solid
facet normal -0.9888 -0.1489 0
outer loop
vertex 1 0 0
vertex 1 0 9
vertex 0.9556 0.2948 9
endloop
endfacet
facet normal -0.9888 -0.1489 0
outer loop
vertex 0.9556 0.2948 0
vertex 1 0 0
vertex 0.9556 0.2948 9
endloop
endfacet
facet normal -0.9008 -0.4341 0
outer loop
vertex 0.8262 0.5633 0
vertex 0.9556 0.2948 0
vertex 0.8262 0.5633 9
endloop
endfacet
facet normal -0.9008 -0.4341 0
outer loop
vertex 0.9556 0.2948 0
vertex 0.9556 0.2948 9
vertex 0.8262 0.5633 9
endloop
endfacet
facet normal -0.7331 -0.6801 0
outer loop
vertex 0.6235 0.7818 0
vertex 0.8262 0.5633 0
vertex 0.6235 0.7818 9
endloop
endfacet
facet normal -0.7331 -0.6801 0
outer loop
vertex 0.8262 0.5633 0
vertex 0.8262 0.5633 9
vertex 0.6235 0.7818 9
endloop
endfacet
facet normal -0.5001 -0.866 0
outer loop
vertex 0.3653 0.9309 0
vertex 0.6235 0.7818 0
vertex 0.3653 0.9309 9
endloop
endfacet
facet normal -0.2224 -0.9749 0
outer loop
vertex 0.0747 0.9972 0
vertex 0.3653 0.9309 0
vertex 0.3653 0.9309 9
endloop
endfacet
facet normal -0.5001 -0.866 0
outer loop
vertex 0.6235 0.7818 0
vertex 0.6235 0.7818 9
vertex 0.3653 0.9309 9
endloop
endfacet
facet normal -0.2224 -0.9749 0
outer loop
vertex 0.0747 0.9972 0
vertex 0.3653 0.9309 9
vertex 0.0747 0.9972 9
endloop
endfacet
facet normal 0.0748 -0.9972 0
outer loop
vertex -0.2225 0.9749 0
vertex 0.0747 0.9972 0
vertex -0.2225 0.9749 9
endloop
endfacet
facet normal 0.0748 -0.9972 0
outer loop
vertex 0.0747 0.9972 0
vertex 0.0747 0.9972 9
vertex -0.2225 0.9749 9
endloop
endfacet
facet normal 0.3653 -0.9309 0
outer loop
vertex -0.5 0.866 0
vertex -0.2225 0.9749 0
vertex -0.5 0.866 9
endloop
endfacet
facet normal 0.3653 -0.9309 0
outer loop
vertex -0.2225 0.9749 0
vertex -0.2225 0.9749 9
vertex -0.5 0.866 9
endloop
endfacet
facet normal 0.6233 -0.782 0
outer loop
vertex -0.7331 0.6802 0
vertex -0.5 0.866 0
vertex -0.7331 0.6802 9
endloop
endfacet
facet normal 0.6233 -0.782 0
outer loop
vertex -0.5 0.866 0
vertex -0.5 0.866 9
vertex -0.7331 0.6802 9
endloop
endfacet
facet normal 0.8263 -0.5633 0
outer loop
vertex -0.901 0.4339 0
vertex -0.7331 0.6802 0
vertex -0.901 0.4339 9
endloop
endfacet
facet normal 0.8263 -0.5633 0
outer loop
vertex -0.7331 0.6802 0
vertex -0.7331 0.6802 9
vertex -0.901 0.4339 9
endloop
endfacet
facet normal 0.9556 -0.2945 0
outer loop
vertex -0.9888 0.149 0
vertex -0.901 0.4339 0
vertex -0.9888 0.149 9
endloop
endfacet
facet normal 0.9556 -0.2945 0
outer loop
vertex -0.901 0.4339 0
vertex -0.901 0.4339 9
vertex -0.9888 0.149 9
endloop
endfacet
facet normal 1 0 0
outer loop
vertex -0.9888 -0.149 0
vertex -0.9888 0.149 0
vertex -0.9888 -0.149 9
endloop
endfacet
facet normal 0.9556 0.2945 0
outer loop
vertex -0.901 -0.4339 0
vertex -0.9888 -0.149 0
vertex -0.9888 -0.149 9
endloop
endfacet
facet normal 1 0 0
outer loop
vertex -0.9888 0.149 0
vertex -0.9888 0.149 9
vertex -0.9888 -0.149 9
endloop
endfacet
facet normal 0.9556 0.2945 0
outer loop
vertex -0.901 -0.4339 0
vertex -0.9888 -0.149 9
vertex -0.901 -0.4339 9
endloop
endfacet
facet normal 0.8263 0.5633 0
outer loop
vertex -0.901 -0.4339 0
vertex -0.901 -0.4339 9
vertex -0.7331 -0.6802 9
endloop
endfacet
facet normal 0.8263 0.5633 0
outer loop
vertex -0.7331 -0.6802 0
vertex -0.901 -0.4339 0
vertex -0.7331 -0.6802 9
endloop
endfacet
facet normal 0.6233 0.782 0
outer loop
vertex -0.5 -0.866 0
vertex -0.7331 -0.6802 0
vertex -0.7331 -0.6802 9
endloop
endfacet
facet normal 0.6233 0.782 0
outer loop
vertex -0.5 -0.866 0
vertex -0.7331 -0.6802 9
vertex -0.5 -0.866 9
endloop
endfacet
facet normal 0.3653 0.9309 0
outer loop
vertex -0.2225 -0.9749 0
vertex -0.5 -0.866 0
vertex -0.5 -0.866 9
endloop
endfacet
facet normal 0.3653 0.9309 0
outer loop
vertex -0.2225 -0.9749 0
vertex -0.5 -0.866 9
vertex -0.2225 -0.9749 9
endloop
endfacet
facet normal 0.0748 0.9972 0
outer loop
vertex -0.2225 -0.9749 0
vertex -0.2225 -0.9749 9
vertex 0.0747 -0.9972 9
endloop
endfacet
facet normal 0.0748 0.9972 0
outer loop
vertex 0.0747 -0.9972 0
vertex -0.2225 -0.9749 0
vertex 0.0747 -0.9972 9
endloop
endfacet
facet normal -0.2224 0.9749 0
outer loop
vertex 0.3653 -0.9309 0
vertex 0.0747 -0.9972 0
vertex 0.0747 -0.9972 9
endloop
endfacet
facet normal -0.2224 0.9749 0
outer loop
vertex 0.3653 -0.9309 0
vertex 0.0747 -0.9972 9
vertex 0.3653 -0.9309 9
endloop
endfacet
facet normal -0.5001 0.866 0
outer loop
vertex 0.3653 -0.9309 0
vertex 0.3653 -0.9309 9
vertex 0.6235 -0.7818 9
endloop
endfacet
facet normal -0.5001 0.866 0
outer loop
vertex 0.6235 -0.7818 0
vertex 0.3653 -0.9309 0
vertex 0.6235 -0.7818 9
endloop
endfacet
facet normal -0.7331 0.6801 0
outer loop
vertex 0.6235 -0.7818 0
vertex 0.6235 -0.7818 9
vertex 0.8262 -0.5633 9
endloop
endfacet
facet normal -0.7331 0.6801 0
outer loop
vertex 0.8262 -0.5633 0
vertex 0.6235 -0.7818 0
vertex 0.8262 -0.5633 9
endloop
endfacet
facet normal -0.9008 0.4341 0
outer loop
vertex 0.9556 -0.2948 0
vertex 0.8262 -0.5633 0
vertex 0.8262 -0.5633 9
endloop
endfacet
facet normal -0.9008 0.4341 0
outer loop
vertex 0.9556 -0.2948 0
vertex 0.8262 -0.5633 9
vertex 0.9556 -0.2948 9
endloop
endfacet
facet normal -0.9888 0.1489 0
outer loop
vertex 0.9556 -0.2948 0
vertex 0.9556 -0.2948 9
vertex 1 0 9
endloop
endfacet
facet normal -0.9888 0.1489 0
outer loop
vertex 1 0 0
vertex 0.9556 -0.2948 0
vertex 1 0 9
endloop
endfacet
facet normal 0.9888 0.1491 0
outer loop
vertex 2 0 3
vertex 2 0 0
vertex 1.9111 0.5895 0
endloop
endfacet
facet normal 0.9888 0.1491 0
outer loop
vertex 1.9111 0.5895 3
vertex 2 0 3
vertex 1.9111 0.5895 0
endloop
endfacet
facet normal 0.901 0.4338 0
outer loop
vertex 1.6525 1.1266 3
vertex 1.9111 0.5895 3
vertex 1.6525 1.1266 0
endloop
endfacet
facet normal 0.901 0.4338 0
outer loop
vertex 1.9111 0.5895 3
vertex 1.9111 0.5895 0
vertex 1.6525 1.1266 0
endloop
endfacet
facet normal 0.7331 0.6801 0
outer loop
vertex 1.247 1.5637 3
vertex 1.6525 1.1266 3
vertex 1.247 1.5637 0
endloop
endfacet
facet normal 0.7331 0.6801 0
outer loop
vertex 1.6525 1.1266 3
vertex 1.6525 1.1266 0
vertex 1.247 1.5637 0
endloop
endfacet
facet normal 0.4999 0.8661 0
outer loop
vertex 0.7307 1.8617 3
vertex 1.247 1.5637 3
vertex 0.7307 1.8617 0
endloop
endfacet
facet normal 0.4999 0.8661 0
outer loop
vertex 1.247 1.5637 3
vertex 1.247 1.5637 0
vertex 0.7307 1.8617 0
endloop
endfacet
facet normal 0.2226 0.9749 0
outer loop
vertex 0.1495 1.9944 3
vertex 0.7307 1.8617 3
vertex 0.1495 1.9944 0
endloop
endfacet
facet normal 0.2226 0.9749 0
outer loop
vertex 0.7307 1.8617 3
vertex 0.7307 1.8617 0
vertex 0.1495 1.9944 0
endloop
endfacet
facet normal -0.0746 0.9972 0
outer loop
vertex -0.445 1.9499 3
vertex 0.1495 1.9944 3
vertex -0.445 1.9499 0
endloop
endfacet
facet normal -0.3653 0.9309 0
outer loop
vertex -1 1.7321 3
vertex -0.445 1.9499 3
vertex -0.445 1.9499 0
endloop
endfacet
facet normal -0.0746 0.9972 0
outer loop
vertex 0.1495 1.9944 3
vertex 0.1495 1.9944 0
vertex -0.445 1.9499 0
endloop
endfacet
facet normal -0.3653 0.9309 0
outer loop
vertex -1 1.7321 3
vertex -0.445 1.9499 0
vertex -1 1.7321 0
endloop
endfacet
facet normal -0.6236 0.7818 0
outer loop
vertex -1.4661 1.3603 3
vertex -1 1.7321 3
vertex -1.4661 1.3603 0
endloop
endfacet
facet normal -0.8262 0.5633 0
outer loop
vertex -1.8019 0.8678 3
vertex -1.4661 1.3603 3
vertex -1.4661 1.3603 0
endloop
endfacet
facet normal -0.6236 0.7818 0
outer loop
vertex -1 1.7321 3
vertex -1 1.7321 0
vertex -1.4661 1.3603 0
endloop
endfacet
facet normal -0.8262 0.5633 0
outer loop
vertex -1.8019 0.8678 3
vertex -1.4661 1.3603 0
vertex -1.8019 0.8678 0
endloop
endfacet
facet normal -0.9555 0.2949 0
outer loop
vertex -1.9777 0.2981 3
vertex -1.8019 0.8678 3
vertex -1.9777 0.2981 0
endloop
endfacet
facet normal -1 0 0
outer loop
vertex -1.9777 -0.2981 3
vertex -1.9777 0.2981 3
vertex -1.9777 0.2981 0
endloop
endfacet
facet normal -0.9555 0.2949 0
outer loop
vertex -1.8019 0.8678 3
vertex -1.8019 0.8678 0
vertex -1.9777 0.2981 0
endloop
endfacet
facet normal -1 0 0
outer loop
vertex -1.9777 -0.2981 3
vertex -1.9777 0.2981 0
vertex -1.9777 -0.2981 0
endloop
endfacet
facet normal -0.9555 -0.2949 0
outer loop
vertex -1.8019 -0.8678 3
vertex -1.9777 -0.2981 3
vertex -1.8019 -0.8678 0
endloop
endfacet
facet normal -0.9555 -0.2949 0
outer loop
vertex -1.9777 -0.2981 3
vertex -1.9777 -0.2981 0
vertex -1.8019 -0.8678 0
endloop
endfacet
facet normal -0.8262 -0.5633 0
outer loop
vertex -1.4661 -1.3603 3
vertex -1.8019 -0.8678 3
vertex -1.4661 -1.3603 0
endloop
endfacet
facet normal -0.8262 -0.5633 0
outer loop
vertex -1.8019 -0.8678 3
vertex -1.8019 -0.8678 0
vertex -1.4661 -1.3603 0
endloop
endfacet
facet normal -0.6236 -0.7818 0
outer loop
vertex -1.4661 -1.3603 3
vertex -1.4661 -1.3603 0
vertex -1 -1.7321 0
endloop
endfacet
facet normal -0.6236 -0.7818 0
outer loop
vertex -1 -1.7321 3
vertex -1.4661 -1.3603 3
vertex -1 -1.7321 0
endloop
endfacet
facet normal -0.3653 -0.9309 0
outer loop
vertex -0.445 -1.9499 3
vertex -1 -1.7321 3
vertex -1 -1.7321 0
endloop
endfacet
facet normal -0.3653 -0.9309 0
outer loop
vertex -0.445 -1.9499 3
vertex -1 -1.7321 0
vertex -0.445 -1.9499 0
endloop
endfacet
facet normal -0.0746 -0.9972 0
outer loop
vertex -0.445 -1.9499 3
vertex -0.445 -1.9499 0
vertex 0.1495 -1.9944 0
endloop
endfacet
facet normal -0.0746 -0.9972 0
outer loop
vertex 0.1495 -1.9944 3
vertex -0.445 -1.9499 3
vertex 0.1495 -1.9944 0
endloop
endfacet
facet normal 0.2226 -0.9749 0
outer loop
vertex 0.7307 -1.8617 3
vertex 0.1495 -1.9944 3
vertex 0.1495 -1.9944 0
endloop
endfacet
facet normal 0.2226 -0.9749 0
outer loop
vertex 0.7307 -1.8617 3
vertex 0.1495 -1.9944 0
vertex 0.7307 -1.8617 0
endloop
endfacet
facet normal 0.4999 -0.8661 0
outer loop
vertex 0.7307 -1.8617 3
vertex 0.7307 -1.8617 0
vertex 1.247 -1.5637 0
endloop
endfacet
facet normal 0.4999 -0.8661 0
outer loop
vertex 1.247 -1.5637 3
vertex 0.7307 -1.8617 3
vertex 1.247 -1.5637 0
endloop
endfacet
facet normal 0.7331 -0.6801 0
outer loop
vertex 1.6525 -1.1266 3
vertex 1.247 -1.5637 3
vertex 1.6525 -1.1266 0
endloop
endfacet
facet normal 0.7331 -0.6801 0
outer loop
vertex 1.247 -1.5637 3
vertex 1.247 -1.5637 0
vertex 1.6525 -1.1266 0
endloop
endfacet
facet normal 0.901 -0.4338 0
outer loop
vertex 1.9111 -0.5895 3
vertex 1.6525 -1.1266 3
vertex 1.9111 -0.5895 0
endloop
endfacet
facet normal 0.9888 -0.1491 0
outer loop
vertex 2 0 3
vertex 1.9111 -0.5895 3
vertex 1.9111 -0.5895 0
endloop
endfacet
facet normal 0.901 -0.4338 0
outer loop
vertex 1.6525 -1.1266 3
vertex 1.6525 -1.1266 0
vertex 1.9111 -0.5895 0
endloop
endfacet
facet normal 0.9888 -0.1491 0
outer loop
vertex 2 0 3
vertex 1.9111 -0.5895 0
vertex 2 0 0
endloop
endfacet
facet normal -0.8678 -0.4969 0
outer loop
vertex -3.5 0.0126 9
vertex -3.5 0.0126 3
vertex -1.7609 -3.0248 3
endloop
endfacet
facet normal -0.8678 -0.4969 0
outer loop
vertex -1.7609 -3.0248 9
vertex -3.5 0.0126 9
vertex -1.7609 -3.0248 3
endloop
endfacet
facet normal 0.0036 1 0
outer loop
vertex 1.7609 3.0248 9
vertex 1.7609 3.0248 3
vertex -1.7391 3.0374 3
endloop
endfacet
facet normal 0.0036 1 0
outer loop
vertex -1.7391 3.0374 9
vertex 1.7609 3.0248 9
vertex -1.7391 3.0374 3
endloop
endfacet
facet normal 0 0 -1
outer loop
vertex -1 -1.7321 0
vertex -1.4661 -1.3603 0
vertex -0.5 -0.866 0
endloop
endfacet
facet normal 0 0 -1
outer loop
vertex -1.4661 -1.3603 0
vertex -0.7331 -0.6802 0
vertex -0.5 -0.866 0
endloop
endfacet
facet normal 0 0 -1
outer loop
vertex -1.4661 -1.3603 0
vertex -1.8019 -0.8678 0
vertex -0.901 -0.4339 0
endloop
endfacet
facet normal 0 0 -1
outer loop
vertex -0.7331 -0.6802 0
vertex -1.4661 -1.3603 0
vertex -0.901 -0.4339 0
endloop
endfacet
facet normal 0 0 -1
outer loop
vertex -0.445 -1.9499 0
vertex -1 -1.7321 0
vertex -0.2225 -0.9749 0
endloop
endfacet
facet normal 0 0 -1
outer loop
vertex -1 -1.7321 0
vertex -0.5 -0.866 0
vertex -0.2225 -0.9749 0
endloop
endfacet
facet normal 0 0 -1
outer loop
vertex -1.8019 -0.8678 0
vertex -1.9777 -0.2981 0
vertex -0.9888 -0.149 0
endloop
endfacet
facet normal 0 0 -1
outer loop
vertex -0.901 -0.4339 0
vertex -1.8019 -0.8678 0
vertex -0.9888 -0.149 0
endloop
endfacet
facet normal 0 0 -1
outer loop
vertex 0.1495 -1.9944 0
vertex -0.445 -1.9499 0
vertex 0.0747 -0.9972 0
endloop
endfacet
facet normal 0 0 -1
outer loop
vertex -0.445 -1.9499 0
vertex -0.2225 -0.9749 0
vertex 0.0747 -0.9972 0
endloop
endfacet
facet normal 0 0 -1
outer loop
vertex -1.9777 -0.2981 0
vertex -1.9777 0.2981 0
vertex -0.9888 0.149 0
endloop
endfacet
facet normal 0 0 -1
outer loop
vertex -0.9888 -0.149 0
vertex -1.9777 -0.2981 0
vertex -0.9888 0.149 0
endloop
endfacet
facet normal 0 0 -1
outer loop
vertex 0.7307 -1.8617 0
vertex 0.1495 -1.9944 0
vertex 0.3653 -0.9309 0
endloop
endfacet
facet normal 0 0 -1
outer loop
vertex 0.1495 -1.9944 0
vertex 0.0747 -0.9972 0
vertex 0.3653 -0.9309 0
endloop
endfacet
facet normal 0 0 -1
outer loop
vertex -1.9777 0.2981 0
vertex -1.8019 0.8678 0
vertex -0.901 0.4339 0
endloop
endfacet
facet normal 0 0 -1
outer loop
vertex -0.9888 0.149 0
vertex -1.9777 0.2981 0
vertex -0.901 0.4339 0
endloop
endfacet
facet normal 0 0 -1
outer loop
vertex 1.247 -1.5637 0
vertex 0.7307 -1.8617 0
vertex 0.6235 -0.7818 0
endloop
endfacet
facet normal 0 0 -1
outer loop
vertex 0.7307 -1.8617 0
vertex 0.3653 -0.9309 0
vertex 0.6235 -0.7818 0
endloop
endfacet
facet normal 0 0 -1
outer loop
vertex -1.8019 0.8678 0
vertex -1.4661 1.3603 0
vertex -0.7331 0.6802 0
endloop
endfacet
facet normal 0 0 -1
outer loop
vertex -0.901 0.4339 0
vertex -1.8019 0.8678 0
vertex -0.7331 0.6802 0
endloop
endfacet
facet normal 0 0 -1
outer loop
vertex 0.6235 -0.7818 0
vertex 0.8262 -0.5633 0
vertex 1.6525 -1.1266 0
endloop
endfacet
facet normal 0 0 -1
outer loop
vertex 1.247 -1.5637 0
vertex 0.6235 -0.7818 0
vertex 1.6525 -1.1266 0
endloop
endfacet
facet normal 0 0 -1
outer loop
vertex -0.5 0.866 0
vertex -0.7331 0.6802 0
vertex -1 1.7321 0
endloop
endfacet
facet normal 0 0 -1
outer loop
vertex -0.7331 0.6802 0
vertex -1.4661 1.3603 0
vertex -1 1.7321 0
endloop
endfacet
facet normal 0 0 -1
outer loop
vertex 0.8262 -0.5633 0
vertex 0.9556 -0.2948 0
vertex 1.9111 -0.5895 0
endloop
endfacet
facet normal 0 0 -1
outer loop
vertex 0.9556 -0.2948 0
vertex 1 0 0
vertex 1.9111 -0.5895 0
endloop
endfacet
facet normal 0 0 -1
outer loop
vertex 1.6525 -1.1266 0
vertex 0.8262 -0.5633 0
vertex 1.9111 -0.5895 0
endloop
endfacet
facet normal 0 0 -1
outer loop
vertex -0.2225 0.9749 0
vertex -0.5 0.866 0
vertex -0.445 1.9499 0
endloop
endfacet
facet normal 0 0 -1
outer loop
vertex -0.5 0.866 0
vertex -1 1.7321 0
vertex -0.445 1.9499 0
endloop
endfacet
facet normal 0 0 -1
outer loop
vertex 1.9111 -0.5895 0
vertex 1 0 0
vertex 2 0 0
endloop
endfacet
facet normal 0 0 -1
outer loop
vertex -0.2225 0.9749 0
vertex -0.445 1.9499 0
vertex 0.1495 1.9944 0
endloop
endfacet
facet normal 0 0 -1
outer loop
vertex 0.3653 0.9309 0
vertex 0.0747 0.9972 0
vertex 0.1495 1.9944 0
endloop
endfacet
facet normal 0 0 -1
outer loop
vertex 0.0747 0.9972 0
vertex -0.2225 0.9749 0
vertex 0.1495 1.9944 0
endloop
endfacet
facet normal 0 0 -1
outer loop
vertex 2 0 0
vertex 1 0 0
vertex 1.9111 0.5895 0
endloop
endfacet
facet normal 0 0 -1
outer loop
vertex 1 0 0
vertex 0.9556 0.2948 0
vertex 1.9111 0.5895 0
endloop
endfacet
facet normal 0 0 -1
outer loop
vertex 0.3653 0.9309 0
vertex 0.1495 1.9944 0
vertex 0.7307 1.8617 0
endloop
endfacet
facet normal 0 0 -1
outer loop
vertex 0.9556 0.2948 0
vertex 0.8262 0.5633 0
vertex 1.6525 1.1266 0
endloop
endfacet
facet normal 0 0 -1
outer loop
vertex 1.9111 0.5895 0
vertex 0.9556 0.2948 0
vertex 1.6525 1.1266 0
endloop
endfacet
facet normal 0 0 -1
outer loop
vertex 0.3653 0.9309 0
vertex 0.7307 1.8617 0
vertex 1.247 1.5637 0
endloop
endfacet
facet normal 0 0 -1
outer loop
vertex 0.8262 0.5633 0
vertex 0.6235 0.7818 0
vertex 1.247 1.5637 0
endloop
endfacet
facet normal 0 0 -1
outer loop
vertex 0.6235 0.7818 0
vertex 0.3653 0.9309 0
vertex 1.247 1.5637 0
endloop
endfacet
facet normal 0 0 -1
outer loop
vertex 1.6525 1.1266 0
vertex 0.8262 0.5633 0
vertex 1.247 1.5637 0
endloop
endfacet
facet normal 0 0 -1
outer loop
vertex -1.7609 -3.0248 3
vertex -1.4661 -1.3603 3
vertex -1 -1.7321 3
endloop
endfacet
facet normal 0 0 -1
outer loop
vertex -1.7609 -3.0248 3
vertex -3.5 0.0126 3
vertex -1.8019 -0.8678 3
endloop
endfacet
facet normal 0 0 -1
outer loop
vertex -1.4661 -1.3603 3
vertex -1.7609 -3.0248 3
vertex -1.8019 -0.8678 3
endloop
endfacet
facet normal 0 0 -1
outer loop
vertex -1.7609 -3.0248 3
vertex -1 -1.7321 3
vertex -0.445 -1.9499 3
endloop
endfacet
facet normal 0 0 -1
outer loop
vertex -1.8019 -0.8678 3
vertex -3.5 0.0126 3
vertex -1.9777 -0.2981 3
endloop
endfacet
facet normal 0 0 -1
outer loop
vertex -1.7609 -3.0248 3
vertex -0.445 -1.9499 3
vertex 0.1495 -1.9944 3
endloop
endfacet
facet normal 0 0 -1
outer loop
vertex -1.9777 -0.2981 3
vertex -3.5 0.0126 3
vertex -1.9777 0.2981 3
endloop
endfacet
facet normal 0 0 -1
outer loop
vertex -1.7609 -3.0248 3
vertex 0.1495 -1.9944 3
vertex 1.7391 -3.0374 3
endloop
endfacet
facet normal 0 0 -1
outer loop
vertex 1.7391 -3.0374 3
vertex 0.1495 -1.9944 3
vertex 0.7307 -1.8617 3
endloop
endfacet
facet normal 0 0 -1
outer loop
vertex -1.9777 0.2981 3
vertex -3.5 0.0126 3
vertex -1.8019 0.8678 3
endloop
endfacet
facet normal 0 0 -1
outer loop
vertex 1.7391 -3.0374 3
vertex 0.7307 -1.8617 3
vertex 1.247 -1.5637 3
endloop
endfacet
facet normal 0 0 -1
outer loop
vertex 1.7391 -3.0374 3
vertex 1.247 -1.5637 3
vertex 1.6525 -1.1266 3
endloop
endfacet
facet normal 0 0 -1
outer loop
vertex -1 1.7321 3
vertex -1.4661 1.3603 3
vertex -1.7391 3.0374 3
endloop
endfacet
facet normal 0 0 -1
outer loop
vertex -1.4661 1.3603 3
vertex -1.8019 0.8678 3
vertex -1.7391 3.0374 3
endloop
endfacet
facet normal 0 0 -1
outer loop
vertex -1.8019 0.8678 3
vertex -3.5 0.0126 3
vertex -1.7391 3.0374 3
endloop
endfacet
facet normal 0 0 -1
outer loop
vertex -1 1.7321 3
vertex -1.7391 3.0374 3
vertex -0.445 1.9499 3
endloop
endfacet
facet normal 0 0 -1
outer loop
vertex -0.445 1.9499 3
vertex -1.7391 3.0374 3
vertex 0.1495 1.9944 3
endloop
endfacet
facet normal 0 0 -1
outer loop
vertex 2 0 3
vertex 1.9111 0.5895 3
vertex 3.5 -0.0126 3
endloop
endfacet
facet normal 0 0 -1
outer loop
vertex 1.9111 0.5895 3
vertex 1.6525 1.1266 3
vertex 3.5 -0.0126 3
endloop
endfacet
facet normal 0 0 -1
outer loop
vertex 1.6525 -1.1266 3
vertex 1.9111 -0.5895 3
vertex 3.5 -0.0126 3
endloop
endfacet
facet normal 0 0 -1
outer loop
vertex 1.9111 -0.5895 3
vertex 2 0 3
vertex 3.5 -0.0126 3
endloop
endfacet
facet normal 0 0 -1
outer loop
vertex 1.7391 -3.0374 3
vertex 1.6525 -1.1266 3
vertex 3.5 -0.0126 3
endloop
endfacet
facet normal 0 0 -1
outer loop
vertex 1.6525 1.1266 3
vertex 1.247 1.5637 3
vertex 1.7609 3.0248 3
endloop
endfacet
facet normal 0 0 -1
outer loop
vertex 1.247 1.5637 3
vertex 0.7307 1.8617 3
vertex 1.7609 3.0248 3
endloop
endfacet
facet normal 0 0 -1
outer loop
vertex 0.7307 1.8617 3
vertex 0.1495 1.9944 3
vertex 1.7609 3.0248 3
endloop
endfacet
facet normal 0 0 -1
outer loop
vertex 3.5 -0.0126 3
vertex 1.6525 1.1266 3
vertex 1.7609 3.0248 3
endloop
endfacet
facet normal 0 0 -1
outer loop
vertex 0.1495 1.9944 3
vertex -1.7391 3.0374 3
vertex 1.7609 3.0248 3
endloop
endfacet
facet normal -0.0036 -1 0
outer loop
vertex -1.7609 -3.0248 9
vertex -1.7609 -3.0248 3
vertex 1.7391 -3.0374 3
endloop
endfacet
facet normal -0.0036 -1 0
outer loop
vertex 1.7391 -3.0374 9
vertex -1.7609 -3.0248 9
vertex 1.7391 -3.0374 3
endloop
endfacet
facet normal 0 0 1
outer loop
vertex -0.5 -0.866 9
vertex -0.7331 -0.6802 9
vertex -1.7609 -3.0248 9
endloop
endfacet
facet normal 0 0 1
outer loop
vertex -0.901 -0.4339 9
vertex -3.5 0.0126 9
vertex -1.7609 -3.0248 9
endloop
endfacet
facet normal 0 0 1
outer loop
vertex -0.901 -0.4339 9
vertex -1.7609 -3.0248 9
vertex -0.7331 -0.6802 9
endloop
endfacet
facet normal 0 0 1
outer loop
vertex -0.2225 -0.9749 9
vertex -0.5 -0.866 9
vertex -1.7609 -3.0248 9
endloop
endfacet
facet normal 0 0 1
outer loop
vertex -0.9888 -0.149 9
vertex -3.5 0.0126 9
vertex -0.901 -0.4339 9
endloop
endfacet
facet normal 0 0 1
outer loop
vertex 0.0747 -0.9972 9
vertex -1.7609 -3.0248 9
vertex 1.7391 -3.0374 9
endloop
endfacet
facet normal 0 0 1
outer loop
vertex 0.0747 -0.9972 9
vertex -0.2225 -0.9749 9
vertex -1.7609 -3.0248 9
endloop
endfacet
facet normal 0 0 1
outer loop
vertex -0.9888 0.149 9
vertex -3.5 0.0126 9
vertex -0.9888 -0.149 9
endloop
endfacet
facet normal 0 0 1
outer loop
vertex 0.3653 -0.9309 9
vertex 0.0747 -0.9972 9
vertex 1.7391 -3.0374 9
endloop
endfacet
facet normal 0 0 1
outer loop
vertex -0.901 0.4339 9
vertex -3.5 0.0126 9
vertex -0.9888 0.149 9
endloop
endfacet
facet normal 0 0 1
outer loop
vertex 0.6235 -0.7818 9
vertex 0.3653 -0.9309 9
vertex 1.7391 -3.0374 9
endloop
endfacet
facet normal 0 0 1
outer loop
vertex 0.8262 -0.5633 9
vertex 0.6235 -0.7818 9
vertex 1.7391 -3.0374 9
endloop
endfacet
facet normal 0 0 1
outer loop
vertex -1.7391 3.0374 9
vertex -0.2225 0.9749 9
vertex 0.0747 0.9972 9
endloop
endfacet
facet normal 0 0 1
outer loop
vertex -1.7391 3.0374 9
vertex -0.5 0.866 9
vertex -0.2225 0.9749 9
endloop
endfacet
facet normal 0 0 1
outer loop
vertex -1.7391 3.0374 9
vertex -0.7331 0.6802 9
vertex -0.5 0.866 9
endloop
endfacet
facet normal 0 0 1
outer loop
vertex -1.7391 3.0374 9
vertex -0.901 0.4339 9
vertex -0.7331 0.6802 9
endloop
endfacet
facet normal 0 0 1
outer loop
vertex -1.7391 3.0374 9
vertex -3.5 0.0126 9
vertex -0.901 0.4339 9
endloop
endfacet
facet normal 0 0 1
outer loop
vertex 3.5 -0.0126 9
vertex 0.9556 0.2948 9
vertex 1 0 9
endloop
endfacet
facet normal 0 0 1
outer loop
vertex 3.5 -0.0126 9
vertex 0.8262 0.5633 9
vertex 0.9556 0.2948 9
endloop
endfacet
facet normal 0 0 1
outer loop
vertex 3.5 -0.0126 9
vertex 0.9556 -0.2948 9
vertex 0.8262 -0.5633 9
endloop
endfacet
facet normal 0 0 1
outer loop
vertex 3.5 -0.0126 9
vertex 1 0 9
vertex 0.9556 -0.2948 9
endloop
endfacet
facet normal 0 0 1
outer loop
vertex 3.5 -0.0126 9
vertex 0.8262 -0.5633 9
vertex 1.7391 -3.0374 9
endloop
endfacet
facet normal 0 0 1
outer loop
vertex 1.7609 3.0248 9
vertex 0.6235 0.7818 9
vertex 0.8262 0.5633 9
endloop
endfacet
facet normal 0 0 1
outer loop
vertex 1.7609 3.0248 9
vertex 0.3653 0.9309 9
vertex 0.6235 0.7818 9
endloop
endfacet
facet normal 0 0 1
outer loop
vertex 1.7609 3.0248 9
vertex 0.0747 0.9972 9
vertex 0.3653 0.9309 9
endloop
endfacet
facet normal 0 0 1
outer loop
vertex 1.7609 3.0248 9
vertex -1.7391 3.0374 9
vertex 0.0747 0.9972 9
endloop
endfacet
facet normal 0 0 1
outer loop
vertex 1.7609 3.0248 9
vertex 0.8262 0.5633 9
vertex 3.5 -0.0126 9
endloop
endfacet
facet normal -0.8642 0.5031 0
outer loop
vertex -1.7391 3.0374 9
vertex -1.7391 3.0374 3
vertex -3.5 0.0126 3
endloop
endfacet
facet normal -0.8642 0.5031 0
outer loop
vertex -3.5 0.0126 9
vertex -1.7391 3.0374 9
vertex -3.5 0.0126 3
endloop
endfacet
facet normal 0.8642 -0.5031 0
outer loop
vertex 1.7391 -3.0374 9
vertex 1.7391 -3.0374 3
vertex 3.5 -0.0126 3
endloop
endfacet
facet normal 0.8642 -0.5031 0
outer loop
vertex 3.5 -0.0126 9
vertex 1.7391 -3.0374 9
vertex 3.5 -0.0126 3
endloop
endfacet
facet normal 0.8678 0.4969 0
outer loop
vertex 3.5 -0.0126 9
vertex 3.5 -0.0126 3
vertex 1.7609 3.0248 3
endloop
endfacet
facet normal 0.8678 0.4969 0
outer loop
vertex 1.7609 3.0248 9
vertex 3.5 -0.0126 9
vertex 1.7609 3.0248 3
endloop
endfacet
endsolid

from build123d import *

# Parameters (mm, degrees)
SKETCH_1_R          = 2
EXTRUDE_1_DEPTH     = 3
EXTRUDE_2_DEPTH     = 6
SKETCH_3_R          = 1
CUT_EXTRUDE_1_DEPTH = 10


with BuildPart() as part:
    # 草图1 → 凸台-拉伸1 (new body)
    with BuildSketch(Plane.XY):
        Circle(SKETCH_1_R)
    extrude(amount=EXTRUDE_1_DEPTH)

    # 草图2 → 凸台-拉伸2 (add)
    with BuildSketch(Plane.XY.offset(3)):
        Polygon((1.760877545, 3.024782682), (-1.739099871, 3.037356028), (-3.499977416, 0.012573346), (-1.760877545, -3.024782682), (1.739099871, -3.037356028), (3.499977416, -0.012573346), align=None)
    extrude(amount=EXTRUDE_2_DEPTH)

    # 草图3 → 切除-拉伸1 (cut)
    with BuildSketch(Plane.XY.offset(9)):
        Circle(SKETCH_3_R)
    extrude(amount=-CUT_EXTRUDE_1_DEPTH, mode=Mode.SUBTRACT)


solid = part.part
